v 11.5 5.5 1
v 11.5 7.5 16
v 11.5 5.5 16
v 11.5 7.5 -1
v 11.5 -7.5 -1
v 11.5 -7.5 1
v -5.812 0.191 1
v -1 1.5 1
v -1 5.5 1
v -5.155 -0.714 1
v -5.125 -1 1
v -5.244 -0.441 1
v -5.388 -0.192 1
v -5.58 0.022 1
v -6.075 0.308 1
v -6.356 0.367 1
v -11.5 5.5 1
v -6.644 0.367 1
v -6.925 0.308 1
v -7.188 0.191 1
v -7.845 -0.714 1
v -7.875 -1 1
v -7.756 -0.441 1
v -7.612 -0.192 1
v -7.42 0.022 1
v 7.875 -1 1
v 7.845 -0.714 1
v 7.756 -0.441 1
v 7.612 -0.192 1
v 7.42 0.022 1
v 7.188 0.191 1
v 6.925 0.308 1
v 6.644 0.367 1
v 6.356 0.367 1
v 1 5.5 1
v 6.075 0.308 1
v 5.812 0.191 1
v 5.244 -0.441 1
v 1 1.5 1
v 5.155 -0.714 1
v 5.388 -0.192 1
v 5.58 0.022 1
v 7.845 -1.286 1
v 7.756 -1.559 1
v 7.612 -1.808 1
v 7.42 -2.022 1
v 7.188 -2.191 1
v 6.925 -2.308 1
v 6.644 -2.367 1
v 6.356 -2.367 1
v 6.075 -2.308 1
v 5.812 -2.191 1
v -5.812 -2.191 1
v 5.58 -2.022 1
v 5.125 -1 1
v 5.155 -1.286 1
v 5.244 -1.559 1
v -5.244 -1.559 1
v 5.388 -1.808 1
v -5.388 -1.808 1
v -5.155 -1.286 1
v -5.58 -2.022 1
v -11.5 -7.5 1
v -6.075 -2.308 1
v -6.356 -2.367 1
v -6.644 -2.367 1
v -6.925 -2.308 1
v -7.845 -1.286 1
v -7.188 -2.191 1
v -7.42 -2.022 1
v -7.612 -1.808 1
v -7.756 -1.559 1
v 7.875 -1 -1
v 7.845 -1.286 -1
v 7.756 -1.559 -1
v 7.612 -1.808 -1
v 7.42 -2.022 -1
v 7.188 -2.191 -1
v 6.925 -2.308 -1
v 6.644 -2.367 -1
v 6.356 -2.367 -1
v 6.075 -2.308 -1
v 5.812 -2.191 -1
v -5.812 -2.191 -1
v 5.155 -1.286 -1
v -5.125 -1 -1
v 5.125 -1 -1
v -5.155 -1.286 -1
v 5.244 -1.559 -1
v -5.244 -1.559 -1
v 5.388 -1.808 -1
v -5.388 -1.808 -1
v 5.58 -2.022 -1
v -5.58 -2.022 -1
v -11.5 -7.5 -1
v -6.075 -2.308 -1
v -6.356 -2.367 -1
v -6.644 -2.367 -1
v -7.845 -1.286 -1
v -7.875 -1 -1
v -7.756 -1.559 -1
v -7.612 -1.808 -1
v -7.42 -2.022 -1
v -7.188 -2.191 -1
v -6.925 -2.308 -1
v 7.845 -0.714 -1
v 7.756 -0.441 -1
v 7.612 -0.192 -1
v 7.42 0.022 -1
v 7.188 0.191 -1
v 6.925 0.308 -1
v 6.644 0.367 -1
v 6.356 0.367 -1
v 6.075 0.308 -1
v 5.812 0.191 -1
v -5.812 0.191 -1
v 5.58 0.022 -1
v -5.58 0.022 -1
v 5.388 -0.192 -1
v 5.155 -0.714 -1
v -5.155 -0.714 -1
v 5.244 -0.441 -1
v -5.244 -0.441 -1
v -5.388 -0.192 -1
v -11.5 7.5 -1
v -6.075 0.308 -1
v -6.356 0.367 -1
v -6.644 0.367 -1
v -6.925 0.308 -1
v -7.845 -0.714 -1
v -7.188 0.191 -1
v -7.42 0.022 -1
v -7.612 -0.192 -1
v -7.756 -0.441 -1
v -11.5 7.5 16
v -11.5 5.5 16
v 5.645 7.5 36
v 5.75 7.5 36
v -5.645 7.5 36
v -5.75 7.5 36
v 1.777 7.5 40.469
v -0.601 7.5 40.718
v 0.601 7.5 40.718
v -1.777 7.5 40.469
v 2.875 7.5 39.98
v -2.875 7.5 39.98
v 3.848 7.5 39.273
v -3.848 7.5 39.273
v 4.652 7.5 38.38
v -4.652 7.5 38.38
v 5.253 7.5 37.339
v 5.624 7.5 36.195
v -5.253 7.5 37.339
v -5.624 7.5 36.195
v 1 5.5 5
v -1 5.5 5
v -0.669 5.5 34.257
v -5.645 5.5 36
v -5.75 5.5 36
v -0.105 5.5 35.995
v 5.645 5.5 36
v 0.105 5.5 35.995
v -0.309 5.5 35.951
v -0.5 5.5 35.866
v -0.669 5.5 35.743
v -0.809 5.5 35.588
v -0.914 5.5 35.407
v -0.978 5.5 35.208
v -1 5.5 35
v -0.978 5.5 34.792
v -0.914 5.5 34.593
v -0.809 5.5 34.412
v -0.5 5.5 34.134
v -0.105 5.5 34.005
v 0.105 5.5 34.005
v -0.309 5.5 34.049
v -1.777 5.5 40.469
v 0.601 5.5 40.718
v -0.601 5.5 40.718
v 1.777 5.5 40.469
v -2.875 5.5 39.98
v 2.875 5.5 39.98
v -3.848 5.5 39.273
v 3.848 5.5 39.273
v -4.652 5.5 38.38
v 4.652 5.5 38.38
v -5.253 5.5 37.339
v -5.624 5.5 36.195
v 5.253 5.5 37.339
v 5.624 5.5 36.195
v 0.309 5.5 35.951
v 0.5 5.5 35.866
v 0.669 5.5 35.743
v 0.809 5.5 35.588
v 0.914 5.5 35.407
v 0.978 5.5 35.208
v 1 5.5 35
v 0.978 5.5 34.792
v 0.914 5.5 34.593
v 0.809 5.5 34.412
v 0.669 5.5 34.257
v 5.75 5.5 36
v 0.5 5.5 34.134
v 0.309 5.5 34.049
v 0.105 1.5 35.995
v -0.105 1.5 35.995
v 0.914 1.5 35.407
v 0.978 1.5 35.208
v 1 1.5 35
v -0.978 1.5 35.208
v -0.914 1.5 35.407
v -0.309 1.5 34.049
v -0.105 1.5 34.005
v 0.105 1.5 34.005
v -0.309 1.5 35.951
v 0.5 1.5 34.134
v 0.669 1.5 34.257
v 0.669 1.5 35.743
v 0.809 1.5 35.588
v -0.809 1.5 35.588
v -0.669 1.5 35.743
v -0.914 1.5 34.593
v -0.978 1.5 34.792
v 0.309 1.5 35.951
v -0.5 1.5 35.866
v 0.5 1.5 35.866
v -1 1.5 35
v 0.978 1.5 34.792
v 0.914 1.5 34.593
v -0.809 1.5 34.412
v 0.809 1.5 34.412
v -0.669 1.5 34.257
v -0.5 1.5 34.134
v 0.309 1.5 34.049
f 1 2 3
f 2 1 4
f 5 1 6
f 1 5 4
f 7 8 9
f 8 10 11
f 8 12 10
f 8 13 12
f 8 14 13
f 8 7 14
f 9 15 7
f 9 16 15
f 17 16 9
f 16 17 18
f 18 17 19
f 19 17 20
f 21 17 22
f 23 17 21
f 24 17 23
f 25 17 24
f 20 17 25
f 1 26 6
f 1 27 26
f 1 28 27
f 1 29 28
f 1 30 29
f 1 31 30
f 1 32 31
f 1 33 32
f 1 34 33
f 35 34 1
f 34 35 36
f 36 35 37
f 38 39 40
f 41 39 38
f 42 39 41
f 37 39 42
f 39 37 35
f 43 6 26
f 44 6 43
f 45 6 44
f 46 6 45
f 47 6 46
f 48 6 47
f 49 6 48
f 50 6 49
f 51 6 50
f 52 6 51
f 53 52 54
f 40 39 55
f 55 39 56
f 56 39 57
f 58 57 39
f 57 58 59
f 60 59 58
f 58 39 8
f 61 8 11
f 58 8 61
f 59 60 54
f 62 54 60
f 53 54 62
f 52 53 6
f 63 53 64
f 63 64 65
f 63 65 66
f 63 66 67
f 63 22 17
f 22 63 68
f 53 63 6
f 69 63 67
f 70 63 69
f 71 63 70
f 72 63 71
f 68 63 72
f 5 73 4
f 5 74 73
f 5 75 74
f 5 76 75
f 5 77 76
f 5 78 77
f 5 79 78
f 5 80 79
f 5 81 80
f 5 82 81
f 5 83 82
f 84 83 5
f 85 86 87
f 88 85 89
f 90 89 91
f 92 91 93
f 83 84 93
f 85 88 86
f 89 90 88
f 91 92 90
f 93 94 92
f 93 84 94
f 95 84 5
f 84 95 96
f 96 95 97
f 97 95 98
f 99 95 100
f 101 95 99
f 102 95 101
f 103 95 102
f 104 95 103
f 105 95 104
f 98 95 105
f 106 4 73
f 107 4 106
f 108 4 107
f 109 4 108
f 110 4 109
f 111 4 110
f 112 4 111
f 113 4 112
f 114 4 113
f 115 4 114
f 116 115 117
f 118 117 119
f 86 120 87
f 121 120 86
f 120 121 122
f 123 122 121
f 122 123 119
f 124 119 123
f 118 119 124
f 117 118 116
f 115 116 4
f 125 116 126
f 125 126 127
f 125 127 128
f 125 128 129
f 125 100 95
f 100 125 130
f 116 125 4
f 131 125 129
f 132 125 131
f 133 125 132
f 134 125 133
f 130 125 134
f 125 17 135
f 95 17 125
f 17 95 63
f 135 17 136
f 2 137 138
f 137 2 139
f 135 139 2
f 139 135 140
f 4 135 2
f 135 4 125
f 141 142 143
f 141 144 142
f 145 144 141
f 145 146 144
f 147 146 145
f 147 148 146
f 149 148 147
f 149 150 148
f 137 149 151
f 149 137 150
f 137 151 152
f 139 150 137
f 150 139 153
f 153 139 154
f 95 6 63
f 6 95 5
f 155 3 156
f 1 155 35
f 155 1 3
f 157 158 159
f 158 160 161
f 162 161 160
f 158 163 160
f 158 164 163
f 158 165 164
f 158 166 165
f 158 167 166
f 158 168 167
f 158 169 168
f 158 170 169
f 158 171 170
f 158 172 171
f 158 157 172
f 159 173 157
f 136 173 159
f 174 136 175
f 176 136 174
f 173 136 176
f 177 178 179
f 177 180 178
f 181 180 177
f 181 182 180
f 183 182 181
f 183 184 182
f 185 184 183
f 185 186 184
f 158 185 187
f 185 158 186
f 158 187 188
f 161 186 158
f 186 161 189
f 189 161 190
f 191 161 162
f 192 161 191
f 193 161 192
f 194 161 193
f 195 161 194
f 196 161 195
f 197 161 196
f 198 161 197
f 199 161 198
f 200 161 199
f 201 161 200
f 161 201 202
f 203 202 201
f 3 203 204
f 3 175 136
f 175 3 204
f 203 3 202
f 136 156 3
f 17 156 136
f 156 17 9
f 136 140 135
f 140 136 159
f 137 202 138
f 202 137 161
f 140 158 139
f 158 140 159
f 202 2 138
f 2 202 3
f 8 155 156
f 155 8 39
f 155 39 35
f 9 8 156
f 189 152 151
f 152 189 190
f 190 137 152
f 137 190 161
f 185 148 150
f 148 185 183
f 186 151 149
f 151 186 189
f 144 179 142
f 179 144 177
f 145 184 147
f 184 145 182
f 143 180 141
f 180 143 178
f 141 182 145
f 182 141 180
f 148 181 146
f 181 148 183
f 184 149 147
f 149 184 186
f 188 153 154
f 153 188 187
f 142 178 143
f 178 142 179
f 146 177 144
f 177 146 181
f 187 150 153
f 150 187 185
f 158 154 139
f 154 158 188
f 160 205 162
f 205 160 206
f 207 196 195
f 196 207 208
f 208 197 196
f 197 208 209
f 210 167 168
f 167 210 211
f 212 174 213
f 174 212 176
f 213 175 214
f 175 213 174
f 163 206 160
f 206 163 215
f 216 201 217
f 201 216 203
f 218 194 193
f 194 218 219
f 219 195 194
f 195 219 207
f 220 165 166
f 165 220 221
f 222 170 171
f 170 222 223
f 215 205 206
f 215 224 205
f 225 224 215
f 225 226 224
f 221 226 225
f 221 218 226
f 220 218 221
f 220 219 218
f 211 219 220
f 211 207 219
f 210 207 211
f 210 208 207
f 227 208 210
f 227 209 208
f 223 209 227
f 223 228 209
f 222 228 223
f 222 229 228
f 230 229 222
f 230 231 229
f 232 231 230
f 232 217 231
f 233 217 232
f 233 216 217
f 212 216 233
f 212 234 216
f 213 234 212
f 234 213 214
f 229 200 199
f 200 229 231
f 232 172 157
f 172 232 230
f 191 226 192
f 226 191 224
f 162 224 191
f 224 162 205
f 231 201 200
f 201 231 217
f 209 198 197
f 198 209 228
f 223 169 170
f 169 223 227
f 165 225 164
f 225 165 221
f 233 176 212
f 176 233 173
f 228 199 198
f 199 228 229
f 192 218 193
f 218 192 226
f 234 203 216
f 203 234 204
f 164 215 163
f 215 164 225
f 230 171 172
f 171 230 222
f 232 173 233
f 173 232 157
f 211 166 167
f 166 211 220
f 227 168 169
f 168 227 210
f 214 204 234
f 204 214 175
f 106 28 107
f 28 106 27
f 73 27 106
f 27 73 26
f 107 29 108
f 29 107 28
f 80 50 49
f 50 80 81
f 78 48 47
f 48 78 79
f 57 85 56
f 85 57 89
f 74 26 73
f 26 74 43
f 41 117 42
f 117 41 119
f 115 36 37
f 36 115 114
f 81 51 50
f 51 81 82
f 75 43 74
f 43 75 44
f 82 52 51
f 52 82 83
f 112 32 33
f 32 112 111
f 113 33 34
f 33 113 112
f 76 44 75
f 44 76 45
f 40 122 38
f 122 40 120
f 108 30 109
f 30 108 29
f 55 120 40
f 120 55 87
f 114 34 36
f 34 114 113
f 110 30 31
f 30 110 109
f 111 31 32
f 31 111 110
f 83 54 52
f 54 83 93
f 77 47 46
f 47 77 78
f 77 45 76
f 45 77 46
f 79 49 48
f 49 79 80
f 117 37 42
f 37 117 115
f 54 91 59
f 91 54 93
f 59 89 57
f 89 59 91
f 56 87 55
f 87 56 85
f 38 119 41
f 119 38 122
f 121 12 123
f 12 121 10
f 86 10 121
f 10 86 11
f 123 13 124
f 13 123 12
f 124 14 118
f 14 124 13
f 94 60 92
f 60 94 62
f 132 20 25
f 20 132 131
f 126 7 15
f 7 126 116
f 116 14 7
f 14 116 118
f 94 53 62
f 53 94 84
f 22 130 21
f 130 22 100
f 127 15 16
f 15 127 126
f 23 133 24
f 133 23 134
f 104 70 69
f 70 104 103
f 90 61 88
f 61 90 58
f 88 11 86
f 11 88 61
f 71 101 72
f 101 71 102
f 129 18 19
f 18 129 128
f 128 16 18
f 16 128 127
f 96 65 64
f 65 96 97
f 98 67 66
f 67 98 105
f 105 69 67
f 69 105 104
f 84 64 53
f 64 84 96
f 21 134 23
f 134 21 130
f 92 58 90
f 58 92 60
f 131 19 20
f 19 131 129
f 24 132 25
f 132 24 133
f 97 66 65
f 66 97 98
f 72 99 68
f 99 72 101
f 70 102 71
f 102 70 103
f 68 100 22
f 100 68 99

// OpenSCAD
module backdoor_blind_bracket(base=[23,15,2], height=35) {   
    difference() {
        // Build the main body
        union() {
            cube(base, true);
            
            translate([0,base[1]/2-1,base[2]+6.5]) 
                cube([base[0], 2, 15], true);
            
            translate([0,base[1]/2-1,(base[2]/2)+15]) 
                linear_extrude(height=height-15, scale=[.5,1]) 
                    square([base[0], 2], true);
            
            translate([-1,base[1]/2-2,1]) 
                linear_extrude(height=4, scale=[1,0]) 
                    rotate([180, 0, 0]) 
                        square([2, 4]);
            
            translate([0,base[1]/2-1,height]) 
                rotate([90,0,0]) 
                    cylinder(2, r = base[0]/2/2, $fn=30, center=true);   
            
            translate([0,base[1]/2-4,height]) 
                rotate([90,0,0]) 
                    cylinder(4, r=1, $fn=30, center=true);
        }
        
        // Put screw holes in base
        translate([base[0]/2-5,-base[2]/2,0]) 
            cylinder(10, r=1.375, $fn=30, center=true);
        
        translate([-base[0]/2+5,-base[2]/2,0]) 
            cylinder(10, r=1.375, $fn=30, center=true);
    }
}

backdoor_blind_bracket();
